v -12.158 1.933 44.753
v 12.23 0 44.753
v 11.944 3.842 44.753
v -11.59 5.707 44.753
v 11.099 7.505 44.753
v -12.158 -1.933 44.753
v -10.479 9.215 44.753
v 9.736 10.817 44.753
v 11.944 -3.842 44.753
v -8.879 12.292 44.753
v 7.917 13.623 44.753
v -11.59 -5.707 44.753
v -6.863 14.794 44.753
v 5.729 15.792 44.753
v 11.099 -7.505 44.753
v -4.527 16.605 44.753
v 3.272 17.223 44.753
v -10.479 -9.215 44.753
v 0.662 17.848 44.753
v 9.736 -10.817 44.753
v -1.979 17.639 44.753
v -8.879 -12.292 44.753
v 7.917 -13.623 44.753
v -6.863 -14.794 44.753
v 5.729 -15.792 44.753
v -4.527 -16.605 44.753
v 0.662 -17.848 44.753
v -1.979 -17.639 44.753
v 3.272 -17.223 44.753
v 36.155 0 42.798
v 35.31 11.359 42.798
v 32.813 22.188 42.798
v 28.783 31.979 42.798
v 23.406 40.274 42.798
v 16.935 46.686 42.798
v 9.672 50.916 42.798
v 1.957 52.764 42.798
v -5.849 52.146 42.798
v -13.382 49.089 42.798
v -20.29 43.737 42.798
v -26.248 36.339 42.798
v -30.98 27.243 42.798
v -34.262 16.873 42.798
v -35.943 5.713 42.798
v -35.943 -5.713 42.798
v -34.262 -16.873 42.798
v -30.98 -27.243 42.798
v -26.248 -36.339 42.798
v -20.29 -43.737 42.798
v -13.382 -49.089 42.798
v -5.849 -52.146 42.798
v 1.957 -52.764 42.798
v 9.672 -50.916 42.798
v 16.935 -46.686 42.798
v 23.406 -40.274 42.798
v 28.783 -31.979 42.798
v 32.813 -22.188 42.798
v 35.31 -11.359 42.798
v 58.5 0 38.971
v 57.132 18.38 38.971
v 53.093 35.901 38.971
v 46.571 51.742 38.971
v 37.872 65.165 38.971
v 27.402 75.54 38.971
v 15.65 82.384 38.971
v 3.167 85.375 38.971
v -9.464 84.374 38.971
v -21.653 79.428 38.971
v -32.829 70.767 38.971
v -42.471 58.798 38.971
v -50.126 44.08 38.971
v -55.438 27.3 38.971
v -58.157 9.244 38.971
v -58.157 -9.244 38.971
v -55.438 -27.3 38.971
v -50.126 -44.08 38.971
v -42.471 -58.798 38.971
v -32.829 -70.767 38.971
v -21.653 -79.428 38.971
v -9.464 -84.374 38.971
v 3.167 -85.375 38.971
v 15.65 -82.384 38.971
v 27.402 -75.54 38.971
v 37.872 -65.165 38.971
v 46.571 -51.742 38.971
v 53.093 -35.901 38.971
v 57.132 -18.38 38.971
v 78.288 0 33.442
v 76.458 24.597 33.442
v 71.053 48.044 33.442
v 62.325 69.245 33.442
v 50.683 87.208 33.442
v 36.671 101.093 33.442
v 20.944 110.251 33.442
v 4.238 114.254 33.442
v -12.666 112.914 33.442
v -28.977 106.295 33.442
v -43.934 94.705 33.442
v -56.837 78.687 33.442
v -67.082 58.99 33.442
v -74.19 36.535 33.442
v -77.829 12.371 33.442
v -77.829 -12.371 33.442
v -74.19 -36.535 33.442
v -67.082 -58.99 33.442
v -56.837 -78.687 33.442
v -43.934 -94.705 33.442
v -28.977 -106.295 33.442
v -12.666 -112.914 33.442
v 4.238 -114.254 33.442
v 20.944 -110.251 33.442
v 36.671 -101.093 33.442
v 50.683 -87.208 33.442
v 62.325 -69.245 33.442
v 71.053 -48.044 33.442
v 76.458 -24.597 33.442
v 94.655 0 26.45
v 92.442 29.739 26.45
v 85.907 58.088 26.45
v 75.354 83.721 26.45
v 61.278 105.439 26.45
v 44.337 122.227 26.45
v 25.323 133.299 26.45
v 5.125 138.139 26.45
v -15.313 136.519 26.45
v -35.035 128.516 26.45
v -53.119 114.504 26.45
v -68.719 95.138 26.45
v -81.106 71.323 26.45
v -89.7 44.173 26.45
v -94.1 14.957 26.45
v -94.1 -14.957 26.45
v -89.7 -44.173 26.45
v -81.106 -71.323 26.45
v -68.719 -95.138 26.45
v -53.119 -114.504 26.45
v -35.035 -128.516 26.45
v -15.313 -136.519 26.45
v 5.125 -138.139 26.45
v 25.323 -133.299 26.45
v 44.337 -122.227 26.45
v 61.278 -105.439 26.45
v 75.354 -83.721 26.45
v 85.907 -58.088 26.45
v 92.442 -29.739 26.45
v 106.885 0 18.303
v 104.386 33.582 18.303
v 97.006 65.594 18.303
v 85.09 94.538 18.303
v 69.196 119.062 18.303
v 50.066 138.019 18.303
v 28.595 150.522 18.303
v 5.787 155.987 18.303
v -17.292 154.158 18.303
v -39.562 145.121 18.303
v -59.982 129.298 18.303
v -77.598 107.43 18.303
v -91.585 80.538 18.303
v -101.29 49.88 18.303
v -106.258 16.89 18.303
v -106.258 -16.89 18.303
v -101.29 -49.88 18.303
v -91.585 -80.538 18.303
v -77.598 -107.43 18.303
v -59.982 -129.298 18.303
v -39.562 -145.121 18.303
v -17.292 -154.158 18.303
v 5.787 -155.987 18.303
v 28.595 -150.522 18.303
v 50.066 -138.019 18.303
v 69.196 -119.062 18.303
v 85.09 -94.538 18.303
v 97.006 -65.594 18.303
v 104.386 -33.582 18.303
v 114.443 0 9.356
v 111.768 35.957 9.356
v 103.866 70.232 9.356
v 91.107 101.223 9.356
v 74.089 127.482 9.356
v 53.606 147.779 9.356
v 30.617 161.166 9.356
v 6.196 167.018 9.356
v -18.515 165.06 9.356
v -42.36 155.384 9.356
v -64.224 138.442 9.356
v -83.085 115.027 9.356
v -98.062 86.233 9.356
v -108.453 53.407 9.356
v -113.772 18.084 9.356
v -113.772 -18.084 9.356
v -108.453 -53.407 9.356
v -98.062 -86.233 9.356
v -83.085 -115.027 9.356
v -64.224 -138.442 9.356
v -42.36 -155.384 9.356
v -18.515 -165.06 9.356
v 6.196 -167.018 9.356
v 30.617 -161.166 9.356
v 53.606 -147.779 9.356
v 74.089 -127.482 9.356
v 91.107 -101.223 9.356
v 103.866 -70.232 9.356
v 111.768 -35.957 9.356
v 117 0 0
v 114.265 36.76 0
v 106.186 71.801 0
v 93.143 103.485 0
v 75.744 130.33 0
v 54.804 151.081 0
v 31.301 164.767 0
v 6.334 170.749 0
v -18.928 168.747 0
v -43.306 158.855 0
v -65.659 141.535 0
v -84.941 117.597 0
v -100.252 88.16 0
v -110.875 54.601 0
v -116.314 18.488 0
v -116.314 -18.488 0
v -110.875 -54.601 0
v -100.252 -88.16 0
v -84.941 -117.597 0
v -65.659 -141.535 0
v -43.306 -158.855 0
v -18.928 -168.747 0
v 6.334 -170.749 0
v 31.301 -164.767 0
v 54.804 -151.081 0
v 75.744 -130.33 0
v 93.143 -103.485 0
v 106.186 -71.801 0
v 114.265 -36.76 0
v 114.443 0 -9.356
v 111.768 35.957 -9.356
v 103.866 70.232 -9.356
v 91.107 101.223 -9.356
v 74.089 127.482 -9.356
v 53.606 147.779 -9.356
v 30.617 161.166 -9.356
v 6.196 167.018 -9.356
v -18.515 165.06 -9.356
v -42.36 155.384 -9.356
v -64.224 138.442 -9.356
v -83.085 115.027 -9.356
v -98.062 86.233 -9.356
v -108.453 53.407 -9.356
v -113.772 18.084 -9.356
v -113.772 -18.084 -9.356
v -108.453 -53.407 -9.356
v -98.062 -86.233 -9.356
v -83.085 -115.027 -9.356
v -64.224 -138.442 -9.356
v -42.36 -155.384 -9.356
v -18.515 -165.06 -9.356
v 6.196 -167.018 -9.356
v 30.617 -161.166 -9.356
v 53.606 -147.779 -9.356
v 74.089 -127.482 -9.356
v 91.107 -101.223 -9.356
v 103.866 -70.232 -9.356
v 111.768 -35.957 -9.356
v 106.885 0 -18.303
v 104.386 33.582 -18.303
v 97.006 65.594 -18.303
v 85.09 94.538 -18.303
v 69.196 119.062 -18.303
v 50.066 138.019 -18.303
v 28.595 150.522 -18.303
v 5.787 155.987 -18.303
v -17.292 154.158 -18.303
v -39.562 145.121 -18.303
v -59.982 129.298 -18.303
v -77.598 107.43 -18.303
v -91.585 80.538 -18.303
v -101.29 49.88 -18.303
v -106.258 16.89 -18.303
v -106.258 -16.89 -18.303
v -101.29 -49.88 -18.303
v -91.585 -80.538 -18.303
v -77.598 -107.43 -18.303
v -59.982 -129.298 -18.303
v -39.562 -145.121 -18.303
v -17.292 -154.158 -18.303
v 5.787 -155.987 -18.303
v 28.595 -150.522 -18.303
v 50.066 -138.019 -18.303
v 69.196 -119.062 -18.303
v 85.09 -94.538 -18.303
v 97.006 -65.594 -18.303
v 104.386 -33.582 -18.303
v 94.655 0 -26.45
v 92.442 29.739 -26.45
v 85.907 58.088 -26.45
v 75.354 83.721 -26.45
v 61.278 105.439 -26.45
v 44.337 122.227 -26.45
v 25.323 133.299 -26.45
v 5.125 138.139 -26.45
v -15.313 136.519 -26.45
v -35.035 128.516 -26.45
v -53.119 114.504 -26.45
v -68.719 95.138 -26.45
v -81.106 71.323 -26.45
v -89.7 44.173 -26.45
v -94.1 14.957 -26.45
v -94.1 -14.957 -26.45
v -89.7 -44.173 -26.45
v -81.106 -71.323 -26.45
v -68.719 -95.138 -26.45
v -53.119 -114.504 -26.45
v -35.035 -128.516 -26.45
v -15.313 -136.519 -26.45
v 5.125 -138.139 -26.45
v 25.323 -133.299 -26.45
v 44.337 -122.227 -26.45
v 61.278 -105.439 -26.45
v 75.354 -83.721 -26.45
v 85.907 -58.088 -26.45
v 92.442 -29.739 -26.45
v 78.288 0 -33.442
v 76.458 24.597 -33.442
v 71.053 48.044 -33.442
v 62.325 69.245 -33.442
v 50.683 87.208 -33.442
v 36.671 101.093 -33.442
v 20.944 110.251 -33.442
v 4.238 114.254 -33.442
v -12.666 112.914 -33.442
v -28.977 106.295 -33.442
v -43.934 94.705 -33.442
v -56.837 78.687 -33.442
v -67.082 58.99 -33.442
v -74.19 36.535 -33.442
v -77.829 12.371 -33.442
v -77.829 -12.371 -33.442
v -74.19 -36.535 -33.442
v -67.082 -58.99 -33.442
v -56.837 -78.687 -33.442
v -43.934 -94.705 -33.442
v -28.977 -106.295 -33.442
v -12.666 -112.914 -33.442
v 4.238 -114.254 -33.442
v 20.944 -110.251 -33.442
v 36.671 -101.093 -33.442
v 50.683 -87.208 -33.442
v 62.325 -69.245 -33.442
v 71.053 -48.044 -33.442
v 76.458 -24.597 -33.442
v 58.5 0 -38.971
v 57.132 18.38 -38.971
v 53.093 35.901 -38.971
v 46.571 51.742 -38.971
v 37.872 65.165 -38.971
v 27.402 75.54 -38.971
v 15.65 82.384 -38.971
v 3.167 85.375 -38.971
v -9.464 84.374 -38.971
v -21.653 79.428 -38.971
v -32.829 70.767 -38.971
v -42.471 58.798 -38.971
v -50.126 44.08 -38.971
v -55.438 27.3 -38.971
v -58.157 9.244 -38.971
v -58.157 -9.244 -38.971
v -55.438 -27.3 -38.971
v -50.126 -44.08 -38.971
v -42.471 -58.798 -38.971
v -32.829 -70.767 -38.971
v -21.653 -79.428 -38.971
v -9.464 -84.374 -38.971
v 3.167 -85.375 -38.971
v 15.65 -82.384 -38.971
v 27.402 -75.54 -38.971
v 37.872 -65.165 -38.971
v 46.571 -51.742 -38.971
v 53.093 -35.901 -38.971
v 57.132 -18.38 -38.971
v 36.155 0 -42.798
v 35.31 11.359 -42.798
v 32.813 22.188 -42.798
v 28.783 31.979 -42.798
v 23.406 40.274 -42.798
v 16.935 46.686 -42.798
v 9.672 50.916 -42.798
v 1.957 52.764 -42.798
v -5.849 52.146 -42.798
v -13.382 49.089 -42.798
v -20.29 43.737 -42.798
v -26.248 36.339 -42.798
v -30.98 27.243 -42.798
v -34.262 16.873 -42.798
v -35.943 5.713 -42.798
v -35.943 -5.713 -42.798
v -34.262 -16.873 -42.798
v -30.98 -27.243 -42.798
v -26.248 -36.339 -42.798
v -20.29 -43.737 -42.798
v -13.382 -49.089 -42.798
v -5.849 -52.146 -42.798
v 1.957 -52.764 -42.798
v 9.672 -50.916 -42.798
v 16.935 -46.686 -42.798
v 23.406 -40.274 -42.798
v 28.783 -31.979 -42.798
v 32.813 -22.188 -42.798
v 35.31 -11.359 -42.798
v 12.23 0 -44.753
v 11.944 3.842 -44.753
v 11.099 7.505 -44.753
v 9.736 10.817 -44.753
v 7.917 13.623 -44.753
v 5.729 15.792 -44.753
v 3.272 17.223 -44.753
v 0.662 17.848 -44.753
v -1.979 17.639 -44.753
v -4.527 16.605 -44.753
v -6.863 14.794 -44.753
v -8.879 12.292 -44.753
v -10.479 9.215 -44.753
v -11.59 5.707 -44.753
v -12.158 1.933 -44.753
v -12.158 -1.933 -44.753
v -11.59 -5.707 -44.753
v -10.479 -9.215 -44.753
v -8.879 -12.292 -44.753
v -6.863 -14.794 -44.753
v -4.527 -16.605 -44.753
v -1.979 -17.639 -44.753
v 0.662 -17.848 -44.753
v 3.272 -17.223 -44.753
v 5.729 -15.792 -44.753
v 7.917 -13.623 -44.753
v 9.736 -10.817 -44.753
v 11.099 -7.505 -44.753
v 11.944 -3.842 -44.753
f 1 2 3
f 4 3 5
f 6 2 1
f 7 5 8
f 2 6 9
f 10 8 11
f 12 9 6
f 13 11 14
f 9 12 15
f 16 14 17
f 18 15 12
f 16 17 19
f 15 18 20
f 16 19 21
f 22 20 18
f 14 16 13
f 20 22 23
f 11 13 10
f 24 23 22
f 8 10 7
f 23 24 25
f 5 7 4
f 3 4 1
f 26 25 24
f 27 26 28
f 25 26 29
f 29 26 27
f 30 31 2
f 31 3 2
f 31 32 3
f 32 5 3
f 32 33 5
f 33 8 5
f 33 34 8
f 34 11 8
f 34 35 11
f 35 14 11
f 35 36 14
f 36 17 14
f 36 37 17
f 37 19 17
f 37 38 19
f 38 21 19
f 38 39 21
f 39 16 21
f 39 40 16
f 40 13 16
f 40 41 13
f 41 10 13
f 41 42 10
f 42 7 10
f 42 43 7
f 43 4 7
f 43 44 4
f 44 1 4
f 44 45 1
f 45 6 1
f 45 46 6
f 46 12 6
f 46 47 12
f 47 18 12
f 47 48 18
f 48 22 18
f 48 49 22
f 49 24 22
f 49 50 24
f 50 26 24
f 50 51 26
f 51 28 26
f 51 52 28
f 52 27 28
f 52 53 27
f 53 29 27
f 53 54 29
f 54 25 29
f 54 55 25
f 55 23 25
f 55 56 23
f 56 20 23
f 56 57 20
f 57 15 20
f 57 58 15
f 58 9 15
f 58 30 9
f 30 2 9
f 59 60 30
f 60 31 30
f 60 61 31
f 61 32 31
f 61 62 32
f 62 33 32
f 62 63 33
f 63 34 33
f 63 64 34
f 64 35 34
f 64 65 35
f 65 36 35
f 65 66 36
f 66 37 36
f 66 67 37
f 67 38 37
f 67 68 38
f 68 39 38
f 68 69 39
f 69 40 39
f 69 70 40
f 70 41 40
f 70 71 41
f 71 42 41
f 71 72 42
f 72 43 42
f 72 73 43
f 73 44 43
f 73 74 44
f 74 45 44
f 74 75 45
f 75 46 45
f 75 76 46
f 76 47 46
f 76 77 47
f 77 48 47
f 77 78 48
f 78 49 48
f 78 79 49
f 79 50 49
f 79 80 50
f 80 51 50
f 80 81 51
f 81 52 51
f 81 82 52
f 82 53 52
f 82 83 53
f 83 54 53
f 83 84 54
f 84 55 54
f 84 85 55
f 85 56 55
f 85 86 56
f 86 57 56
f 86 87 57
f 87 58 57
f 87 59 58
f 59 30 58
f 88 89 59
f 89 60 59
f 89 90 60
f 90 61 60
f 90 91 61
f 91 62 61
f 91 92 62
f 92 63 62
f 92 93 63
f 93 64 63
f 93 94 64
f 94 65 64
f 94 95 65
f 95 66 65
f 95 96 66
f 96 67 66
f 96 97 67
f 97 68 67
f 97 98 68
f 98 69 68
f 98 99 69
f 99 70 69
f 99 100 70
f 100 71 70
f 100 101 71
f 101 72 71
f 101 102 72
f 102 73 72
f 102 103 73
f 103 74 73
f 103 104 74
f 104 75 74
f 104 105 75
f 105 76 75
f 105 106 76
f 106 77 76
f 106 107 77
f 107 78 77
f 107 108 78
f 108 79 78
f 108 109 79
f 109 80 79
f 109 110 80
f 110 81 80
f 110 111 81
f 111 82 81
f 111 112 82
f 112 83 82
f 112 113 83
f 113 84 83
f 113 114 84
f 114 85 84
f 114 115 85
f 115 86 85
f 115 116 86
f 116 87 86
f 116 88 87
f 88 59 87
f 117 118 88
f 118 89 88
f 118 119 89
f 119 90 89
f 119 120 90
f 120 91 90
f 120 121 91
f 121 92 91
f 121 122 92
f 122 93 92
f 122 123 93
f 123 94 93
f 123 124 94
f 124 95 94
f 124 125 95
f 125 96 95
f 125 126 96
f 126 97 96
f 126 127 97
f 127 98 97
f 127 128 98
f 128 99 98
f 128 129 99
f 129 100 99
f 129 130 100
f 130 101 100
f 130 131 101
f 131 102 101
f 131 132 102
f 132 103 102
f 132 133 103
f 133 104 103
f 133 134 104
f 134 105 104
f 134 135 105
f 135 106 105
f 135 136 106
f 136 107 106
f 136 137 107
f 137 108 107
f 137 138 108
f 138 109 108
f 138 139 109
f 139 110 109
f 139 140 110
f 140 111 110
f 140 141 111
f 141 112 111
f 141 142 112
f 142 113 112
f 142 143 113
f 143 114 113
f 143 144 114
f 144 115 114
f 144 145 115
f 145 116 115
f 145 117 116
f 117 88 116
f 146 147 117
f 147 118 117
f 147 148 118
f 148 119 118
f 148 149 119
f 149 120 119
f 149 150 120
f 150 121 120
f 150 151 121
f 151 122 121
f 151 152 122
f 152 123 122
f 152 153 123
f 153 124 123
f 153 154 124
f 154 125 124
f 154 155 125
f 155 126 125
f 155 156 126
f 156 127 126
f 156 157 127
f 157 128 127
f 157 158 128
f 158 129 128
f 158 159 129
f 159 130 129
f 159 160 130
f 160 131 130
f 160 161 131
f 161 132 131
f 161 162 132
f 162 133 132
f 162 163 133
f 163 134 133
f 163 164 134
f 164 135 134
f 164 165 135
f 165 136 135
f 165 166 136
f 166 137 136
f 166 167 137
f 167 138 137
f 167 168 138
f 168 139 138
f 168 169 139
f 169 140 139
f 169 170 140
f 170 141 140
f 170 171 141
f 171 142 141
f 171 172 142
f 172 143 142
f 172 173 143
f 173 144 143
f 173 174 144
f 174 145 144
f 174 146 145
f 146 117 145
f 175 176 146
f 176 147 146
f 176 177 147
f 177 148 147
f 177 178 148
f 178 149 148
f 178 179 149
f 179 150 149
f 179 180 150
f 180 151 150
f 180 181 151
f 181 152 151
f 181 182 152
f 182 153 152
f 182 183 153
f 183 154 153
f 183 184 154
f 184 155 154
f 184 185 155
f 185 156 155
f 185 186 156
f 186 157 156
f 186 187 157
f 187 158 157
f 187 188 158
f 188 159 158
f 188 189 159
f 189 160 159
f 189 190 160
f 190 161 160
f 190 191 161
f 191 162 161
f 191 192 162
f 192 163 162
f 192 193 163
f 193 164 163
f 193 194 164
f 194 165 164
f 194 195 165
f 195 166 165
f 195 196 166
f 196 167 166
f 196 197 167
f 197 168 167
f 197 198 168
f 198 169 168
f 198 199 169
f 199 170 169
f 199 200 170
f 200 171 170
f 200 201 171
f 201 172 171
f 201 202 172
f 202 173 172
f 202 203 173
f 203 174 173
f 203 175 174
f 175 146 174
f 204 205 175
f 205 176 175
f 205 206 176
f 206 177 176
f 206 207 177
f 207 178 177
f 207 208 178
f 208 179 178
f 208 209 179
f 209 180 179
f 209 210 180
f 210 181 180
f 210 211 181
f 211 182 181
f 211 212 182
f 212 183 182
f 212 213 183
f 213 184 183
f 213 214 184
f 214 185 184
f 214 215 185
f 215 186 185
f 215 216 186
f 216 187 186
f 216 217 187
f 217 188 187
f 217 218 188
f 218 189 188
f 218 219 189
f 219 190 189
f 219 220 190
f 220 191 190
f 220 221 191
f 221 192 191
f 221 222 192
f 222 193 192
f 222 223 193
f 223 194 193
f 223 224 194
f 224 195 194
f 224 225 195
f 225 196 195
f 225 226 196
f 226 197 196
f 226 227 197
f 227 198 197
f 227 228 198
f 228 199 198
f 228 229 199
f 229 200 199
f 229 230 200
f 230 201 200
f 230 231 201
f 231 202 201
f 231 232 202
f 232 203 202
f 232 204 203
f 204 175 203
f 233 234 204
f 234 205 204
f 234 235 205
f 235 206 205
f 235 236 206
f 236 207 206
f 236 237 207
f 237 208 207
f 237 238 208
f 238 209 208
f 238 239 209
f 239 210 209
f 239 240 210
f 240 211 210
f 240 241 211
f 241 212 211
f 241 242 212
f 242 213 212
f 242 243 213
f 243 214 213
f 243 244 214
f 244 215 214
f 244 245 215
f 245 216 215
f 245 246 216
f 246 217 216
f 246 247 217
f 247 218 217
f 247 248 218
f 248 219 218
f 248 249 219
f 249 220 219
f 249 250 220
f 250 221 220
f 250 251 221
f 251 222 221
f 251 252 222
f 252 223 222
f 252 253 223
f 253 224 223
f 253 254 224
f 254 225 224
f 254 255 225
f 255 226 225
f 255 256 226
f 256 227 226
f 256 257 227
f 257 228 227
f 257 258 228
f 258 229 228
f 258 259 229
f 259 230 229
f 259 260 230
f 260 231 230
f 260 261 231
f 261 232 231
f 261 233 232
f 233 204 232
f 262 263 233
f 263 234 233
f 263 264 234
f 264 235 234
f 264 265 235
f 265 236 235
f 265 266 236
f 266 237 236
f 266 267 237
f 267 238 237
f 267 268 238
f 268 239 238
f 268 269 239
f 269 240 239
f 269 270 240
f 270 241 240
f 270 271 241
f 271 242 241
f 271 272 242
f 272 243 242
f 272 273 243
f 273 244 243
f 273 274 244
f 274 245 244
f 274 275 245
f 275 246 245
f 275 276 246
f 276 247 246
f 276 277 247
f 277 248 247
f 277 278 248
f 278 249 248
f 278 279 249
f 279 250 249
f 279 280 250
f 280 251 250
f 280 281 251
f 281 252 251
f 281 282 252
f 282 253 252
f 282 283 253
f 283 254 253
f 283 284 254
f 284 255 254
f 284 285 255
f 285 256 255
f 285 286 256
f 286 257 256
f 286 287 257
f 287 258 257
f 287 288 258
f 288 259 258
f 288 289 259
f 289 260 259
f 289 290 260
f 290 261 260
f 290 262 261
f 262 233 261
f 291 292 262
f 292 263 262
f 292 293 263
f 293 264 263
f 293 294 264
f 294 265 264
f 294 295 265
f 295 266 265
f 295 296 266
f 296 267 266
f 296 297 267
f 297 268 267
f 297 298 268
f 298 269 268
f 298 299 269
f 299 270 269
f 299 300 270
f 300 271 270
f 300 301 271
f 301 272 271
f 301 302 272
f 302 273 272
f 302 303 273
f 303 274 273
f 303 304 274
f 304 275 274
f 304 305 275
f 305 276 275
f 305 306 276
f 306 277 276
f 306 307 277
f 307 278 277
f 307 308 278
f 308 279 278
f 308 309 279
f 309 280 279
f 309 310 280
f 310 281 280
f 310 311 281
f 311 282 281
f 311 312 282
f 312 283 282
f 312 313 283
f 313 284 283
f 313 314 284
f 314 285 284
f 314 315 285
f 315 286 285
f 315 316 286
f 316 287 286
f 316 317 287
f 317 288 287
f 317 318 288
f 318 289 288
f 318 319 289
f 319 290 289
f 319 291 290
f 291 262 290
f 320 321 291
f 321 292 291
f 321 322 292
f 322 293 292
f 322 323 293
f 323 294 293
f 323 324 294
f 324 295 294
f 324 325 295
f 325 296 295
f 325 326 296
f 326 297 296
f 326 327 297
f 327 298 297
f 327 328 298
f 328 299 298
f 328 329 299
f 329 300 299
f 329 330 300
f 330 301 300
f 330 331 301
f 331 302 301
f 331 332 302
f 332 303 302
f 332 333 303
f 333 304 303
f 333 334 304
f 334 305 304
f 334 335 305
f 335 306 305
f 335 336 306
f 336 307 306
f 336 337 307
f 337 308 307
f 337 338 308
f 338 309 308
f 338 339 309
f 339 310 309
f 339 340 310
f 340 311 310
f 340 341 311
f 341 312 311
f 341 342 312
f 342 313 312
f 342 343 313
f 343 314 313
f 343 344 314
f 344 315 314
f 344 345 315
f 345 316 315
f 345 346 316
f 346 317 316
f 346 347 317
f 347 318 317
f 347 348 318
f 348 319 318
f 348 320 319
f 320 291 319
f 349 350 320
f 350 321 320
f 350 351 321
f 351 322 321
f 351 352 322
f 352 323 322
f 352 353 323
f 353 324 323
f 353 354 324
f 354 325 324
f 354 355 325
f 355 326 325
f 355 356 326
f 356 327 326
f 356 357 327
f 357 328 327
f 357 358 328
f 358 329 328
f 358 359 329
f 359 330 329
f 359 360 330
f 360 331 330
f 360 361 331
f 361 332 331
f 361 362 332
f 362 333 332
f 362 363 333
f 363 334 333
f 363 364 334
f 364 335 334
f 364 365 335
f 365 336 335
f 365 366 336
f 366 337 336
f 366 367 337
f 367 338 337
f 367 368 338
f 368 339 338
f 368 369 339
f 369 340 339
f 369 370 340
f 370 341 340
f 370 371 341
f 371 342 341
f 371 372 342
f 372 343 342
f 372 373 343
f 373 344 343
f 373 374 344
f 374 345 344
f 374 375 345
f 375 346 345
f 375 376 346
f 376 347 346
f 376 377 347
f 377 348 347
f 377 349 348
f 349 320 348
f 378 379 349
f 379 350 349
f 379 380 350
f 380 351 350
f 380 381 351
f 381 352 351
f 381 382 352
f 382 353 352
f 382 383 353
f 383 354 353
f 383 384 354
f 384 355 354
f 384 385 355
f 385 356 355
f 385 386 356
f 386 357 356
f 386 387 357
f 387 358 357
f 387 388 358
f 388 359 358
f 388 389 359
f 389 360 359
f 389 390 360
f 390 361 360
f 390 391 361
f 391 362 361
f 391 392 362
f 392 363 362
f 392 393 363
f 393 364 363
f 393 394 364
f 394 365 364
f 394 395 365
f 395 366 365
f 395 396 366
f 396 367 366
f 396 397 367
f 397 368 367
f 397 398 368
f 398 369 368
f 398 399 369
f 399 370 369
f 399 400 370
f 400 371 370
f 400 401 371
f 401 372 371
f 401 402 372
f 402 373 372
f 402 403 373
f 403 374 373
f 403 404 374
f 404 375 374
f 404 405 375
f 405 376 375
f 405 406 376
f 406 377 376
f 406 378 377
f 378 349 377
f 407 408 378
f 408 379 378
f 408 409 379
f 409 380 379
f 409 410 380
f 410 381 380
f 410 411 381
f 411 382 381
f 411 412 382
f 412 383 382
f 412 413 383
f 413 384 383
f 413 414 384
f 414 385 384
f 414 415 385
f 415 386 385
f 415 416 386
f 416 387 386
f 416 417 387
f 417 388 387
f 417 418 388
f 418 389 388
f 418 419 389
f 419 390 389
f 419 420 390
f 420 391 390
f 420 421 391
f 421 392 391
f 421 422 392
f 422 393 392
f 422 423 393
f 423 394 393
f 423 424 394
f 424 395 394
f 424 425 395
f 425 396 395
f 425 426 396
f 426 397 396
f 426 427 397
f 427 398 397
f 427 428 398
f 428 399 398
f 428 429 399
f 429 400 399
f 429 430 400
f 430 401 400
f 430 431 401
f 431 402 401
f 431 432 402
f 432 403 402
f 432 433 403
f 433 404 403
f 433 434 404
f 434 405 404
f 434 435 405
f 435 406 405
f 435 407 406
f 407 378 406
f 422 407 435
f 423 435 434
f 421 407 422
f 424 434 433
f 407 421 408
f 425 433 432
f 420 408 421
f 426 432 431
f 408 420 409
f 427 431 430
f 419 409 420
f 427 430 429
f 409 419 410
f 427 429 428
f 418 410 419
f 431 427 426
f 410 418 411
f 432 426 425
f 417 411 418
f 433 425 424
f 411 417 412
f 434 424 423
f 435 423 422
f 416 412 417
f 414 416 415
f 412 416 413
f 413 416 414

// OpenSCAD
// Generated by SolidPython 1.0.1 on 2020-07-29 00:46:51


scale(v = [13, 19, 5]) {
	sphere(r = 9);
}
/***********************************************
*********      SolidPython code:      **********
************************************************
 
# import packages: SolidPython
from solid import *
from solid.utils import *
from itertools import chain, combinations, permutations


class Resize:

    def __init__(self, scad_file):
        self.scad_file = scad_file
        #self.scad_file = import_scad(scad_file)
        # cone/cylinder param:
        self.r1 = 0
        self.r2 = 0
        self.h = 0
        # rectangular prism param:
        self.w = 0
        self.l = 0
        # ellipse param:
        self.r = 0

    # import OpenScad code (file name corresponds to shape)


    # classify shape + parameters
    def assign(self, param1, param2, param3):
        if self.scad_file == 'cone.scad':
            self.r1 = param1
            self.r2 = param2
            self.h = param3
        elif self.scad_file == 'cylinder.scad':
            self.r1 = param1
            self.r2 = param2
            self.h = param3
        elif self.scad_file == 'rectangularPrism.scad':
            self.h = param1
            self.l = param2
            self.w = param3
        else:
            self.r = param1
            self.h = param2

    # resize parameters
    def iterate(self):
        x = range(3, 20, 2)
        i = 1
        if self.scad_file == 'cone.scad':
            tempList = list(permutations(x, 2))
            for temp in tempList:
                param1 = temp[0]
                param2 = temp[1]
                filepath = 'produced_scad_files/' + 'cone' + str(param1) + '_' + str(param2) + '_' + '.scad'
                scad_render_to_file(cylinder(h=param1, r1=param2, r2=0), filepath)

        elif self.scad_file == 'cylinder.scad':
            tempList = list(permutations(x, 3))
            for temp in tempList:
                param1 = temp[0]
                param2 = temp[1]
                filepath = 'produced_scad_files/' + 'cylinder' + str(param1) + '_' + str(param2) + '_' + '.scad'
                scad_render_to_file(cylinder(h=param1, r1=param2, r2=param2), filepath)

        elif self.scad_file == 'rectangularPrism.scad':
            tempList = list(permutations(x, 3))
            for temp in tempList:
                param1 = temp[0]
                param2 = temp[1]
                param3 = temp[2]
                filepath = 'produced_scad_files/' + 'rectangularPrism' + str(param1) + '_' + str(param2) + '_' + str(
                    param3) + '.scad'
                scad_render_to_file(cube(size=(param1, param2, param3)), filepath)

        elif self.scad_file == 'ellipse.scad':
            tempList = list(permutations(x, 4))
            for temp in tempList:
                param1 = temp[0]
                param2 = temp[1]
                param3 = temp[2]
                param4 = temp[3]
                filepath = 'produced_scad_files/' + 'ellipse' + str(param1) + '_' + str(param2) + '_' + str(param3) + '_' + str(param4) + '.scad'
                scad_render_to_file(scale([param1, param2, param3])(sphere(r=param4)), filepath)

    def render_to_scadfile(self):
        scad_render_to_file(scad, 'example.scad') 
 
************************************************/
